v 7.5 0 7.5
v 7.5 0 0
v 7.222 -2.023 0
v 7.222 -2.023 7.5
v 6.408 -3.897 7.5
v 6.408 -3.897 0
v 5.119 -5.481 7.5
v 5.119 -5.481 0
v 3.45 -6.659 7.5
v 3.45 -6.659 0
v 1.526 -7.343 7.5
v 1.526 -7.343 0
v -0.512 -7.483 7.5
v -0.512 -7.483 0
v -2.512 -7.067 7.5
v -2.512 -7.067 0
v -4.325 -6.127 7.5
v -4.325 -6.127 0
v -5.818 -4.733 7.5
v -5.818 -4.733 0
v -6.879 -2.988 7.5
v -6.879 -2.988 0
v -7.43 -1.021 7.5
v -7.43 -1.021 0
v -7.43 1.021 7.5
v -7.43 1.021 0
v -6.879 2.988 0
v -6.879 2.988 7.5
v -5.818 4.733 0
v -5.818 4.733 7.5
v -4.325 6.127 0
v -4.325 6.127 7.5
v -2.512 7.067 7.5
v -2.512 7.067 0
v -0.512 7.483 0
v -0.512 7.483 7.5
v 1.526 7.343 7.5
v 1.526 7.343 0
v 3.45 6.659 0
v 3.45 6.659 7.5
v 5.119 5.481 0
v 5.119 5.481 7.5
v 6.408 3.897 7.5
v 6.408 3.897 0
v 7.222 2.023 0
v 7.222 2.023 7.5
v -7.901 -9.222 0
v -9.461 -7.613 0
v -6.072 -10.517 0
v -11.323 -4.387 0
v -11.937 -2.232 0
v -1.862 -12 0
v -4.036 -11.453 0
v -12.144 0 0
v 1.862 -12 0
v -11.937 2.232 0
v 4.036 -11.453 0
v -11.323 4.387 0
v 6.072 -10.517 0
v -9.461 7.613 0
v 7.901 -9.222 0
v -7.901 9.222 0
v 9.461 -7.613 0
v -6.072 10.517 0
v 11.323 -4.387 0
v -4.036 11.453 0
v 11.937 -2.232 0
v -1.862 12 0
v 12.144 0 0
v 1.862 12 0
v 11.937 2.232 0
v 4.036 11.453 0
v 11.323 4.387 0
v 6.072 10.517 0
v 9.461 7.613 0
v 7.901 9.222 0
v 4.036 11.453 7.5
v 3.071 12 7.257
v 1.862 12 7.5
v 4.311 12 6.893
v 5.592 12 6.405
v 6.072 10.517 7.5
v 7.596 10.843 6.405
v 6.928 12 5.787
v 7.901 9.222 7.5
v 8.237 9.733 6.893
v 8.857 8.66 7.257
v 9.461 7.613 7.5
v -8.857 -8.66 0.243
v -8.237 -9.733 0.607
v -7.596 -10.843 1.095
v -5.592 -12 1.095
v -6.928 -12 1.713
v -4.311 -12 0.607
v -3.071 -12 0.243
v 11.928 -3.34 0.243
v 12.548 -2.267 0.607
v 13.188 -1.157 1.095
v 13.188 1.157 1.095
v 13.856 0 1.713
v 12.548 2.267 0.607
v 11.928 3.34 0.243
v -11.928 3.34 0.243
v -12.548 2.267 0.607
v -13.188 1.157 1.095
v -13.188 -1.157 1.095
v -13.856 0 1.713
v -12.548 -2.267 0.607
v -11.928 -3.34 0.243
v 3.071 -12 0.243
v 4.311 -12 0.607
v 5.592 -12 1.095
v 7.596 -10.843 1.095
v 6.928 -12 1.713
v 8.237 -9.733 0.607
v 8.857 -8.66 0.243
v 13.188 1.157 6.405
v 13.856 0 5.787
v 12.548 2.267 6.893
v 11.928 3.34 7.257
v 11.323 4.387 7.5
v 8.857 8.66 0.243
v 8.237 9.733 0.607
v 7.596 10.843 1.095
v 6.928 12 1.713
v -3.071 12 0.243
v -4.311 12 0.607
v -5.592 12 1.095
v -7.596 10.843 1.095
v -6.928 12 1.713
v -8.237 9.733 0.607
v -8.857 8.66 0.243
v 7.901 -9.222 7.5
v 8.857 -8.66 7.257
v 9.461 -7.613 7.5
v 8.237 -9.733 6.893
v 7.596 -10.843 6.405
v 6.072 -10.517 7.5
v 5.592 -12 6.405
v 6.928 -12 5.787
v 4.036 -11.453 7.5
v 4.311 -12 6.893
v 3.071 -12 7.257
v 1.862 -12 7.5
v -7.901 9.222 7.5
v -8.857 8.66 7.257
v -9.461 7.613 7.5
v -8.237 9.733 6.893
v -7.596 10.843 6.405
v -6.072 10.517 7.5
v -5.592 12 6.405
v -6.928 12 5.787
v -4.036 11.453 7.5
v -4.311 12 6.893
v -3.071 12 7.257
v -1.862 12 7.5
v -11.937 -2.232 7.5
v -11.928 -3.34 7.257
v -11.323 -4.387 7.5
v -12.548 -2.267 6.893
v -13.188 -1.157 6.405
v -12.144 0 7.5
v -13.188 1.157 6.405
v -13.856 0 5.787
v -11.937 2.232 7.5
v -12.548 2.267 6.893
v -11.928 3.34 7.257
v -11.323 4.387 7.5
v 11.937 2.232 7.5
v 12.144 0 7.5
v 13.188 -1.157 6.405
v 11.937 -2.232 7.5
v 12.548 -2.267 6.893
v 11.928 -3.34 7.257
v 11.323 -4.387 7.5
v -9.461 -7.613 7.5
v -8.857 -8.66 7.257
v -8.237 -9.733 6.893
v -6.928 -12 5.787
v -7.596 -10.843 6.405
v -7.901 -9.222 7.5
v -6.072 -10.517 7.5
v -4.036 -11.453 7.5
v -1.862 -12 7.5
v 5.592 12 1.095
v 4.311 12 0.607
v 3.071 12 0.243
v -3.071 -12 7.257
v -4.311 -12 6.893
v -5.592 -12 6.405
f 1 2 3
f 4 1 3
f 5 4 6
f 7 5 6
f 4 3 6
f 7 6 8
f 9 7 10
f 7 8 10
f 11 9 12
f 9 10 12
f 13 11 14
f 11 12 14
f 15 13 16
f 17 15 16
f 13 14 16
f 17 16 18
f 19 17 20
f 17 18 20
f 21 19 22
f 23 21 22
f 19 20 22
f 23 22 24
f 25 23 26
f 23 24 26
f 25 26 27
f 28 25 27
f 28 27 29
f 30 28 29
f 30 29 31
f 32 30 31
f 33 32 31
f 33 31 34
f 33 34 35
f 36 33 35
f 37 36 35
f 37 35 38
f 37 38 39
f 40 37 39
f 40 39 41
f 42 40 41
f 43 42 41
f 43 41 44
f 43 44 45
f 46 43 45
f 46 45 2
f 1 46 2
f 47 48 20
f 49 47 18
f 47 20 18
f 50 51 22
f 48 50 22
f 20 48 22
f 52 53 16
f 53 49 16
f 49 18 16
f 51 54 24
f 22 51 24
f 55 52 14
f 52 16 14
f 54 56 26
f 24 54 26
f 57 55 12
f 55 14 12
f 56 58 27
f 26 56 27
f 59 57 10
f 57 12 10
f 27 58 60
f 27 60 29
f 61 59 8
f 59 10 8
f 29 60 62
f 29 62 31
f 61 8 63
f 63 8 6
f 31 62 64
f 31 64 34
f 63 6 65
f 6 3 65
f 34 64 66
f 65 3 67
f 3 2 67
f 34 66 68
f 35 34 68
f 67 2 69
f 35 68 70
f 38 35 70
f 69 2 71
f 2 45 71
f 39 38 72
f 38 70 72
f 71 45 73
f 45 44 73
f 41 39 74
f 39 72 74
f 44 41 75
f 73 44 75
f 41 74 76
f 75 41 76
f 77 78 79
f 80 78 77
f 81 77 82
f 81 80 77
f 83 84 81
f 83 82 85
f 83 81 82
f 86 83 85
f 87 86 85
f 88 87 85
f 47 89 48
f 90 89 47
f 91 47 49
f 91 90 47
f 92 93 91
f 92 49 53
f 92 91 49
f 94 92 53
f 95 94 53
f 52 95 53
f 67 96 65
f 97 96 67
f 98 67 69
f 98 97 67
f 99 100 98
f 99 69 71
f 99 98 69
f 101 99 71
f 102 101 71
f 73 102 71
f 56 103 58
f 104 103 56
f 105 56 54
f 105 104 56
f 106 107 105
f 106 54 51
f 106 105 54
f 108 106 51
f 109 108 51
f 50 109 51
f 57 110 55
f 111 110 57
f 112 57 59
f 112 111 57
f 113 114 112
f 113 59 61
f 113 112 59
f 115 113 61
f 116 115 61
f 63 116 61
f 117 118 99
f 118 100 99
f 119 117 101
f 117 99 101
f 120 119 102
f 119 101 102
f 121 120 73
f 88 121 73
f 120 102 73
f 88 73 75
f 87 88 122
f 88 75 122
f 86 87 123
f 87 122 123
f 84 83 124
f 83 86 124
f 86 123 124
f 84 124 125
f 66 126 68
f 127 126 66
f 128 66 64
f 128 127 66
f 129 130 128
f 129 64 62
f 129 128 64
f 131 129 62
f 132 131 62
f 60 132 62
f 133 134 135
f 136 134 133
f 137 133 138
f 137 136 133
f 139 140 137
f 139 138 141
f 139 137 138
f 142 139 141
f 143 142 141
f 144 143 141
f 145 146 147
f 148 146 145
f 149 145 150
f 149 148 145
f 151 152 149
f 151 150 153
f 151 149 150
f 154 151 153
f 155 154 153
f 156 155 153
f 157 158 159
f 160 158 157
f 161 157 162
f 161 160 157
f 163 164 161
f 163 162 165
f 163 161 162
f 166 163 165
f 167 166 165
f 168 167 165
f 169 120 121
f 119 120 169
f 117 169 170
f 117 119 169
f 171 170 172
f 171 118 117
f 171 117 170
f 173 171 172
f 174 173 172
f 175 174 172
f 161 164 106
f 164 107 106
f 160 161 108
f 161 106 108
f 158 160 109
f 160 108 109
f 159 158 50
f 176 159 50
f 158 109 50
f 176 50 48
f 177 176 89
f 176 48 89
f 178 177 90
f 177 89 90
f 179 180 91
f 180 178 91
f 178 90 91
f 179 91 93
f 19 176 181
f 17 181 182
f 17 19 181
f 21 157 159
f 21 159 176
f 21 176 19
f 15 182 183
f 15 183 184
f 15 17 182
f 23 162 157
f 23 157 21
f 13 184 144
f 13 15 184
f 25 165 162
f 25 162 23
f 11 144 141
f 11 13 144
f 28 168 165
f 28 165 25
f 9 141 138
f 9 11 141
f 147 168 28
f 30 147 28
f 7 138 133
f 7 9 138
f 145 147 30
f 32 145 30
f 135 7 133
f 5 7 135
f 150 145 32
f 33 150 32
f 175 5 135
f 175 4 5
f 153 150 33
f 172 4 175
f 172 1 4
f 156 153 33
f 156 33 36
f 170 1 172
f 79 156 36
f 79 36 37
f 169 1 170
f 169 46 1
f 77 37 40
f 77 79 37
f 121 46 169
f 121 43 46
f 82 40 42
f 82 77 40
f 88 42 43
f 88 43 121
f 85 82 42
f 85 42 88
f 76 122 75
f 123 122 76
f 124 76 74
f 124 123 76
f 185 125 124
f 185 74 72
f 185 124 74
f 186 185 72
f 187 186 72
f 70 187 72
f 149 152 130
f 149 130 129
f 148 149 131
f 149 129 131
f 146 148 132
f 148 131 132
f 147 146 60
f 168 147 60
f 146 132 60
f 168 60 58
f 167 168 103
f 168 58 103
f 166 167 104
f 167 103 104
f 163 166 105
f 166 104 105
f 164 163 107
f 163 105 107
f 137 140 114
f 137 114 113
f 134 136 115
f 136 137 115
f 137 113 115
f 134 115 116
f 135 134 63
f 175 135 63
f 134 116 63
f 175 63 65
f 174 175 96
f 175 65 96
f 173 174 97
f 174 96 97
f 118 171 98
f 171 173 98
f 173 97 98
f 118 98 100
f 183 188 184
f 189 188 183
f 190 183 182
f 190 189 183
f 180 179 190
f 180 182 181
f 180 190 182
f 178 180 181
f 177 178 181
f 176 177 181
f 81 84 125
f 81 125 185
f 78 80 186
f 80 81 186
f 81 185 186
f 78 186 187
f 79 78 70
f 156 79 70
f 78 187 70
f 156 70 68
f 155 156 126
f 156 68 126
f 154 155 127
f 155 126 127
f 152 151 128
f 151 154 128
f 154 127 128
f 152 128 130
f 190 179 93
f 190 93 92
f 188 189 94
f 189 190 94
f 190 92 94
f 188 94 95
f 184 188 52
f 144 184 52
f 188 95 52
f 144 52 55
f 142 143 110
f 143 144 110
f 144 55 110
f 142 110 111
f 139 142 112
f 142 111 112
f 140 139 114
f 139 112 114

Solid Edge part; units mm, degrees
sketch "Sketch1" plane through (0, 0, 0) normal (0, 0, 1) x (1, 0, 0)
  line L0 (-6.9282, -12) -> (6.9282, -12)
  line L1 (6.9282, -12) -> (13.8564, 0)
  line L2 (13.8564, 0) -> (6.9282, 12)
  line L3 (6.9282, 12) -> (-6.9282, 12)
  line L4 (-6.9282, 12) -> (-13.8564, 0)
  line L5 (-13.8564, 0) -> (-6.9282, -12)
  dimension "D1" = 13.8564
extrude "Protrusion1" add sketch "Sketch1" along normal blind 7.5
sketch "Sketch2" plane through (0, 0, 0) normal (0, -1, 0) x (1, 0, 0)
  line L0 (-15.1213, 4.5223) -> (-10.8787, 8.7649)
  line L1 (-10.8787, 8.7649) -> (-19.9377, 8.7649)
  line L2 (-19.9377, 8.7649) -> (-19.9377, -1.2649)
  line L3 (-19.9377, -1.2649) -> (-10.8787, -1.2649)
  line L4 (-15.1213, 2.9777) -> (-10.8787, -1.2649)
  line L5 (-15.1213, 2.9777) -> (-15.1213, 4.5223)
revolve "RevolvedCutout1" cut sketch "Sketch2" angle 360 about axis through (0, 0, 57.15) along (0, 0, -1)
sketch "Sketch3" plane through (0, 0, 0) normal (0, 0, -1) x (1, 0, 0)
  circle A0 centre (0, 0) radius 7.5
extrude "Cutout1" cut sketch "Sketch3" against normal through all
properties part number "NutM15" material "Brass, yellow brass"
